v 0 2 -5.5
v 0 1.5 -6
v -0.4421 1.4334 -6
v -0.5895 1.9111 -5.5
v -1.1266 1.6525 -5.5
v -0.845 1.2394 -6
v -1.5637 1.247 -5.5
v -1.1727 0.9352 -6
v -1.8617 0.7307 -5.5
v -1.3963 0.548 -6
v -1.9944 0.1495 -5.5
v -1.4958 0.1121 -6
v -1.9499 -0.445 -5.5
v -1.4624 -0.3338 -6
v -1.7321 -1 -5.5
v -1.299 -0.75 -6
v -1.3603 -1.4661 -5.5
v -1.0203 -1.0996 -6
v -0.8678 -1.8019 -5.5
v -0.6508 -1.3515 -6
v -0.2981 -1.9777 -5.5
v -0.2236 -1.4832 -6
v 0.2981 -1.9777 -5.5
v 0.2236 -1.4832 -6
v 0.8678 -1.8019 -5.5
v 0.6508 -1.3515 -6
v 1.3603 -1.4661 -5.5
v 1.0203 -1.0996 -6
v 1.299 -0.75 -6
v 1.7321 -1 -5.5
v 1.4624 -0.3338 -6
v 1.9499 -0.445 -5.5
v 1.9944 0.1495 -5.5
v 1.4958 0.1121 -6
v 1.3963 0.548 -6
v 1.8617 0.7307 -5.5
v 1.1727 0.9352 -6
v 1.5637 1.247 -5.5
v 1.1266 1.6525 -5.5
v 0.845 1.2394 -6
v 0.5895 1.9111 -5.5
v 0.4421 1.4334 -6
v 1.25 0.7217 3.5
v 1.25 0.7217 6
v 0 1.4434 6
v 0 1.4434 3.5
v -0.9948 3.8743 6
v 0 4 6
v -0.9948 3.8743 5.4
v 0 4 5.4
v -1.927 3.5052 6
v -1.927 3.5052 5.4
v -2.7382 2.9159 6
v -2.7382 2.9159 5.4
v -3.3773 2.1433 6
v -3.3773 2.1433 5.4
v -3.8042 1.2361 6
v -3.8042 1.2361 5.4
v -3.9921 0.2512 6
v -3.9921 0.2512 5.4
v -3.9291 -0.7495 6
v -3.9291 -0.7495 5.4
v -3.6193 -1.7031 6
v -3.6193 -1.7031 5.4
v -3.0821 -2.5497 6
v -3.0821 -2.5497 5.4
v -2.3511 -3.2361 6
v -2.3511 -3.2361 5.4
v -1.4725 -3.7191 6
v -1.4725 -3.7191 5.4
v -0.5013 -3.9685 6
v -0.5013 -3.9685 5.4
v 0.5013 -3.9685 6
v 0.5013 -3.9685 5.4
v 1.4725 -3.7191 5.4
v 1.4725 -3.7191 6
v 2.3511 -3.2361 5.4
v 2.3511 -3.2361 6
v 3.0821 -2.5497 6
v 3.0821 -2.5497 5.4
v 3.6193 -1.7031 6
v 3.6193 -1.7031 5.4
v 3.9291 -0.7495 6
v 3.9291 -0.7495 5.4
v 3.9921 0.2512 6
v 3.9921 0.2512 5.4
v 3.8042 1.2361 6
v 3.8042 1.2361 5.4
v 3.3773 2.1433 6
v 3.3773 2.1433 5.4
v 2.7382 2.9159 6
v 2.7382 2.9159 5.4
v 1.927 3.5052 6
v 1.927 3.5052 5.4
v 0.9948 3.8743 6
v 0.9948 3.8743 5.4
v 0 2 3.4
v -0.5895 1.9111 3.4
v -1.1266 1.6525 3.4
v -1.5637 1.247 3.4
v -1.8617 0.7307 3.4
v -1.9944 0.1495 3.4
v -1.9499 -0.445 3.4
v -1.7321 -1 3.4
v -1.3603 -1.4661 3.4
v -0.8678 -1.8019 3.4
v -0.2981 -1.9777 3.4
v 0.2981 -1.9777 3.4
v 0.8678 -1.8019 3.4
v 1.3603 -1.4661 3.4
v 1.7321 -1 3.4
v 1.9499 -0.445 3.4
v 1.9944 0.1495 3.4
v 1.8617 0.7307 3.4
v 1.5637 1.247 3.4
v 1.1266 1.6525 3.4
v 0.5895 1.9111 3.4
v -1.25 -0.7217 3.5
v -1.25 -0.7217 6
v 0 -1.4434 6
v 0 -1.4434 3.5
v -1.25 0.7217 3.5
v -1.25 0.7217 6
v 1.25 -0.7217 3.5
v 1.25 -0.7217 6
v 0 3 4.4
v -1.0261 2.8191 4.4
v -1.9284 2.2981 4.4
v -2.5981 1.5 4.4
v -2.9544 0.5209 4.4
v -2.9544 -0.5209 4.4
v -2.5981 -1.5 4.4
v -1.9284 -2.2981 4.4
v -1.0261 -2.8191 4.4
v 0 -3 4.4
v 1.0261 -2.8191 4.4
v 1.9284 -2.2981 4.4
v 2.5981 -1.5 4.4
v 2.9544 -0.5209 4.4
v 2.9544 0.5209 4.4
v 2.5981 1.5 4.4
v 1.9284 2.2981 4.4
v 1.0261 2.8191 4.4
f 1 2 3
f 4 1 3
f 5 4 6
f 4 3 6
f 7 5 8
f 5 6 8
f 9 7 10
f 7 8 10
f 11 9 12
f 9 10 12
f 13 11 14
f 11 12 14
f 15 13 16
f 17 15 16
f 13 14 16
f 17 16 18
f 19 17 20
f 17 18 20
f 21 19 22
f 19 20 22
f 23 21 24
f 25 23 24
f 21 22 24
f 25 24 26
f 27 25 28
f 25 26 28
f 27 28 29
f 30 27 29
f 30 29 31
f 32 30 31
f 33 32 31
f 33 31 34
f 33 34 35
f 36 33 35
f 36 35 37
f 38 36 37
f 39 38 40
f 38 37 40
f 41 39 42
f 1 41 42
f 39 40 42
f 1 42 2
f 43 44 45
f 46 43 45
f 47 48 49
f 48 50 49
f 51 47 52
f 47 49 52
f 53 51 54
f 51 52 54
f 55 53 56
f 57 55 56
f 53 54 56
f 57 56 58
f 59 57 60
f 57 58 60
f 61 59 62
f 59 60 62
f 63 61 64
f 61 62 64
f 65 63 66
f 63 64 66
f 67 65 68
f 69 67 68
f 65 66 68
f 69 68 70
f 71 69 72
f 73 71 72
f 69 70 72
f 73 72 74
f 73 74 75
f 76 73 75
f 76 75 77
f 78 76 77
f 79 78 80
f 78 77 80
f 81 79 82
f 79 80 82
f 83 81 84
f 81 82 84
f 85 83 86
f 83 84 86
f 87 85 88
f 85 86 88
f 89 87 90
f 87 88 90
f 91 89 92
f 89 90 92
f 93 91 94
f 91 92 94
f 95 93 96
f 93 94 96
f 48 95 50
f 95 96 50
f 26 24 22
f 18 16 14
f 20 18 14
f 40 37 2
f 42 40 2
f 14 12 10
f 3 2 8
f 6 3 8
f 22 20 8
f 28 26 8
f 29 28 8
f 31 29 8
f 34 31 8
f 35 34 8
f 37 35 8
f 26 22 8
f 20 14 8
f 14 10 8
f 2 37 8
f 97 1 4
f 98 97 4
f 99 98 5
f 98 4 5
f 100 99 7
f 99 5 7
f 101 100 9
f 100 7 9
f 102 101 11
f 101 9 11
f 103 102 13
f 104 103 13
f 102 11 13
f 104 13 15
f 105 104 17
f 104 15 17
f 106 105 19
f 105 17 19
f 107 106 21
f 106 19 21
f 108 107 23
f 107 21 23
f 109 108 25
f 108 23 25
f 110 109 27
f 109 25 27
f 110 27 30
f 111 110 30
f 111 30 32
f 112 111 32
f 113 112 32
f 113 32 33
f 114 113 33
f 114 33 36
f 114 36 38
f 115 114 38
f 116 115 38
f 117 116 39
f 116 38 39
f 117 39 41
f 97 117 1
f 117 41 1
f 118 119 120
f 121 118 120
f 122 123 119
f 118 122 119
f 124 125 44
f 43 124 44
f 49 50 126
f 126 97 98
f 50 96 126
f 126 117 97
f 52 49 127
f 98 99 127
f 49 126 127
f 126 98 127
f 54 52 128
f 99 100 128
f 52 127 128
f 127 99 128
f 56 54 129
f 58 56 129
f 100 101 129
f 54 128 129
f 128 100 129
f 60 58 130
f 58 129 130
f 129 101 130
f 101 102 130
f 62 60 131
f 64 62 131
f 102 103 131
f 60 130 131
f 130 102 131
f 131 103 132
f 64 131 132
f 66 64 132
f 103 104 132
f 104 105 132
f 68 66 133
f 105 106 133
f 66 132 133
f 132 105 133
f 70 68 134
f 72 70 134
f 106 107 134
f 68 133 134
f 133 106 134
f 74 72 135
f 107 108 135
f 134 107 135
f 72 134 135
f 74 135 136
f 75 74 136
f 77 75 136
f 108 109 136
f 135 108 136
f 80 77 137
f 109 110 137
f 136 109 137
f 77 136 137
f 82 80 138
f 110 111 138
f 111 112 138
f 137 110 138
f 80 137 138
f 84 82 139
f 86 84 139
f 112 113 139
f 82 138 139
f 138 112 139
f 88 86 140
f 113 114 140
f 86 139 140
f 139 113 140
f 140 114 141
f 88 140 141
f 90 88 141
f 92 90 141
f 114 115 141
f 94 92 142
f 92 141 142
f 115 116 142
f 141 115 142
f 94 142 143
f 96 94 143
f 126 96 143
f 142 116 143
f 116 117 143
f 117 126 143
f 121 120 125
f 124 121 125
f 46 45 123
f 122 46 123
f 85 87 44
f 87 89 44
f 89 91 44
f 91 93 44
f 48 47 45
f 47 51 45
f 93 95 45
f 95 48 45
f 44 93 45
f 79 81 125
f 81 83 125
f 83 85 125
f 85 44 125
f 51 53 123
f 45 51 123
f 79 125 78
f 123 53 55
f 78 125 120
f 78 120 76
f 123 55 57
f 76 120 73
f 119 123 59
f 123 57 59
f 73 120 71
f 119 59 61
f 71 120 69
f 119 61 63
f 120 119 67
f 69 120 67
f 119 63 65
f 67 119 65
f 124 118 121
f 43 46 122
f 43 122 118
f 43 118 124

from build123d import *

# Parameters (mm, degrees)
CHAMFER_1_SIZE      = 0.5
CUT_EXTRUDE_1_DEPTH = 2.5


with BuildPart() as part:
    # 草图1 → 旋转1 (revolve)
    with BuildSketch(Plane(origin=(0, 0, 0), x_dir=(0, 0, -1), z_dir=(1, 0, 0))):
        Polygon((-6, 0), (-6, 4), (-5.4, 4), (-3.4, 2), (6, 2), (6, 0), align=None)
    revolve(axis=Axis((0, 0, -6), (0, 0, 1)))

    # 倒角1
    chamfer_1_edges = [part.edges().sort_by_distance(p)[0] for p in [
        (0, -2, -6),
    ]]
    chamfer(chamfer_1_edges, length=CHAMFER_1_SIZE)

    # 草图2 → 切除-拉伸1 (cut)
    with BuildSketch(Plane.XY.offset(6)):
        Polygon((0, 1.443375673), (-1.25, 0.721687836), (-1.25, -0.721687836), (0, -1.443375673), (1.25, -0.721687836), (1.25, 0.721687836), align=None)
    extrude(amount=-CUT_EXTRUDE_1_DEPTH, mode=Mode.SUBTRACT)


solid = part.part
